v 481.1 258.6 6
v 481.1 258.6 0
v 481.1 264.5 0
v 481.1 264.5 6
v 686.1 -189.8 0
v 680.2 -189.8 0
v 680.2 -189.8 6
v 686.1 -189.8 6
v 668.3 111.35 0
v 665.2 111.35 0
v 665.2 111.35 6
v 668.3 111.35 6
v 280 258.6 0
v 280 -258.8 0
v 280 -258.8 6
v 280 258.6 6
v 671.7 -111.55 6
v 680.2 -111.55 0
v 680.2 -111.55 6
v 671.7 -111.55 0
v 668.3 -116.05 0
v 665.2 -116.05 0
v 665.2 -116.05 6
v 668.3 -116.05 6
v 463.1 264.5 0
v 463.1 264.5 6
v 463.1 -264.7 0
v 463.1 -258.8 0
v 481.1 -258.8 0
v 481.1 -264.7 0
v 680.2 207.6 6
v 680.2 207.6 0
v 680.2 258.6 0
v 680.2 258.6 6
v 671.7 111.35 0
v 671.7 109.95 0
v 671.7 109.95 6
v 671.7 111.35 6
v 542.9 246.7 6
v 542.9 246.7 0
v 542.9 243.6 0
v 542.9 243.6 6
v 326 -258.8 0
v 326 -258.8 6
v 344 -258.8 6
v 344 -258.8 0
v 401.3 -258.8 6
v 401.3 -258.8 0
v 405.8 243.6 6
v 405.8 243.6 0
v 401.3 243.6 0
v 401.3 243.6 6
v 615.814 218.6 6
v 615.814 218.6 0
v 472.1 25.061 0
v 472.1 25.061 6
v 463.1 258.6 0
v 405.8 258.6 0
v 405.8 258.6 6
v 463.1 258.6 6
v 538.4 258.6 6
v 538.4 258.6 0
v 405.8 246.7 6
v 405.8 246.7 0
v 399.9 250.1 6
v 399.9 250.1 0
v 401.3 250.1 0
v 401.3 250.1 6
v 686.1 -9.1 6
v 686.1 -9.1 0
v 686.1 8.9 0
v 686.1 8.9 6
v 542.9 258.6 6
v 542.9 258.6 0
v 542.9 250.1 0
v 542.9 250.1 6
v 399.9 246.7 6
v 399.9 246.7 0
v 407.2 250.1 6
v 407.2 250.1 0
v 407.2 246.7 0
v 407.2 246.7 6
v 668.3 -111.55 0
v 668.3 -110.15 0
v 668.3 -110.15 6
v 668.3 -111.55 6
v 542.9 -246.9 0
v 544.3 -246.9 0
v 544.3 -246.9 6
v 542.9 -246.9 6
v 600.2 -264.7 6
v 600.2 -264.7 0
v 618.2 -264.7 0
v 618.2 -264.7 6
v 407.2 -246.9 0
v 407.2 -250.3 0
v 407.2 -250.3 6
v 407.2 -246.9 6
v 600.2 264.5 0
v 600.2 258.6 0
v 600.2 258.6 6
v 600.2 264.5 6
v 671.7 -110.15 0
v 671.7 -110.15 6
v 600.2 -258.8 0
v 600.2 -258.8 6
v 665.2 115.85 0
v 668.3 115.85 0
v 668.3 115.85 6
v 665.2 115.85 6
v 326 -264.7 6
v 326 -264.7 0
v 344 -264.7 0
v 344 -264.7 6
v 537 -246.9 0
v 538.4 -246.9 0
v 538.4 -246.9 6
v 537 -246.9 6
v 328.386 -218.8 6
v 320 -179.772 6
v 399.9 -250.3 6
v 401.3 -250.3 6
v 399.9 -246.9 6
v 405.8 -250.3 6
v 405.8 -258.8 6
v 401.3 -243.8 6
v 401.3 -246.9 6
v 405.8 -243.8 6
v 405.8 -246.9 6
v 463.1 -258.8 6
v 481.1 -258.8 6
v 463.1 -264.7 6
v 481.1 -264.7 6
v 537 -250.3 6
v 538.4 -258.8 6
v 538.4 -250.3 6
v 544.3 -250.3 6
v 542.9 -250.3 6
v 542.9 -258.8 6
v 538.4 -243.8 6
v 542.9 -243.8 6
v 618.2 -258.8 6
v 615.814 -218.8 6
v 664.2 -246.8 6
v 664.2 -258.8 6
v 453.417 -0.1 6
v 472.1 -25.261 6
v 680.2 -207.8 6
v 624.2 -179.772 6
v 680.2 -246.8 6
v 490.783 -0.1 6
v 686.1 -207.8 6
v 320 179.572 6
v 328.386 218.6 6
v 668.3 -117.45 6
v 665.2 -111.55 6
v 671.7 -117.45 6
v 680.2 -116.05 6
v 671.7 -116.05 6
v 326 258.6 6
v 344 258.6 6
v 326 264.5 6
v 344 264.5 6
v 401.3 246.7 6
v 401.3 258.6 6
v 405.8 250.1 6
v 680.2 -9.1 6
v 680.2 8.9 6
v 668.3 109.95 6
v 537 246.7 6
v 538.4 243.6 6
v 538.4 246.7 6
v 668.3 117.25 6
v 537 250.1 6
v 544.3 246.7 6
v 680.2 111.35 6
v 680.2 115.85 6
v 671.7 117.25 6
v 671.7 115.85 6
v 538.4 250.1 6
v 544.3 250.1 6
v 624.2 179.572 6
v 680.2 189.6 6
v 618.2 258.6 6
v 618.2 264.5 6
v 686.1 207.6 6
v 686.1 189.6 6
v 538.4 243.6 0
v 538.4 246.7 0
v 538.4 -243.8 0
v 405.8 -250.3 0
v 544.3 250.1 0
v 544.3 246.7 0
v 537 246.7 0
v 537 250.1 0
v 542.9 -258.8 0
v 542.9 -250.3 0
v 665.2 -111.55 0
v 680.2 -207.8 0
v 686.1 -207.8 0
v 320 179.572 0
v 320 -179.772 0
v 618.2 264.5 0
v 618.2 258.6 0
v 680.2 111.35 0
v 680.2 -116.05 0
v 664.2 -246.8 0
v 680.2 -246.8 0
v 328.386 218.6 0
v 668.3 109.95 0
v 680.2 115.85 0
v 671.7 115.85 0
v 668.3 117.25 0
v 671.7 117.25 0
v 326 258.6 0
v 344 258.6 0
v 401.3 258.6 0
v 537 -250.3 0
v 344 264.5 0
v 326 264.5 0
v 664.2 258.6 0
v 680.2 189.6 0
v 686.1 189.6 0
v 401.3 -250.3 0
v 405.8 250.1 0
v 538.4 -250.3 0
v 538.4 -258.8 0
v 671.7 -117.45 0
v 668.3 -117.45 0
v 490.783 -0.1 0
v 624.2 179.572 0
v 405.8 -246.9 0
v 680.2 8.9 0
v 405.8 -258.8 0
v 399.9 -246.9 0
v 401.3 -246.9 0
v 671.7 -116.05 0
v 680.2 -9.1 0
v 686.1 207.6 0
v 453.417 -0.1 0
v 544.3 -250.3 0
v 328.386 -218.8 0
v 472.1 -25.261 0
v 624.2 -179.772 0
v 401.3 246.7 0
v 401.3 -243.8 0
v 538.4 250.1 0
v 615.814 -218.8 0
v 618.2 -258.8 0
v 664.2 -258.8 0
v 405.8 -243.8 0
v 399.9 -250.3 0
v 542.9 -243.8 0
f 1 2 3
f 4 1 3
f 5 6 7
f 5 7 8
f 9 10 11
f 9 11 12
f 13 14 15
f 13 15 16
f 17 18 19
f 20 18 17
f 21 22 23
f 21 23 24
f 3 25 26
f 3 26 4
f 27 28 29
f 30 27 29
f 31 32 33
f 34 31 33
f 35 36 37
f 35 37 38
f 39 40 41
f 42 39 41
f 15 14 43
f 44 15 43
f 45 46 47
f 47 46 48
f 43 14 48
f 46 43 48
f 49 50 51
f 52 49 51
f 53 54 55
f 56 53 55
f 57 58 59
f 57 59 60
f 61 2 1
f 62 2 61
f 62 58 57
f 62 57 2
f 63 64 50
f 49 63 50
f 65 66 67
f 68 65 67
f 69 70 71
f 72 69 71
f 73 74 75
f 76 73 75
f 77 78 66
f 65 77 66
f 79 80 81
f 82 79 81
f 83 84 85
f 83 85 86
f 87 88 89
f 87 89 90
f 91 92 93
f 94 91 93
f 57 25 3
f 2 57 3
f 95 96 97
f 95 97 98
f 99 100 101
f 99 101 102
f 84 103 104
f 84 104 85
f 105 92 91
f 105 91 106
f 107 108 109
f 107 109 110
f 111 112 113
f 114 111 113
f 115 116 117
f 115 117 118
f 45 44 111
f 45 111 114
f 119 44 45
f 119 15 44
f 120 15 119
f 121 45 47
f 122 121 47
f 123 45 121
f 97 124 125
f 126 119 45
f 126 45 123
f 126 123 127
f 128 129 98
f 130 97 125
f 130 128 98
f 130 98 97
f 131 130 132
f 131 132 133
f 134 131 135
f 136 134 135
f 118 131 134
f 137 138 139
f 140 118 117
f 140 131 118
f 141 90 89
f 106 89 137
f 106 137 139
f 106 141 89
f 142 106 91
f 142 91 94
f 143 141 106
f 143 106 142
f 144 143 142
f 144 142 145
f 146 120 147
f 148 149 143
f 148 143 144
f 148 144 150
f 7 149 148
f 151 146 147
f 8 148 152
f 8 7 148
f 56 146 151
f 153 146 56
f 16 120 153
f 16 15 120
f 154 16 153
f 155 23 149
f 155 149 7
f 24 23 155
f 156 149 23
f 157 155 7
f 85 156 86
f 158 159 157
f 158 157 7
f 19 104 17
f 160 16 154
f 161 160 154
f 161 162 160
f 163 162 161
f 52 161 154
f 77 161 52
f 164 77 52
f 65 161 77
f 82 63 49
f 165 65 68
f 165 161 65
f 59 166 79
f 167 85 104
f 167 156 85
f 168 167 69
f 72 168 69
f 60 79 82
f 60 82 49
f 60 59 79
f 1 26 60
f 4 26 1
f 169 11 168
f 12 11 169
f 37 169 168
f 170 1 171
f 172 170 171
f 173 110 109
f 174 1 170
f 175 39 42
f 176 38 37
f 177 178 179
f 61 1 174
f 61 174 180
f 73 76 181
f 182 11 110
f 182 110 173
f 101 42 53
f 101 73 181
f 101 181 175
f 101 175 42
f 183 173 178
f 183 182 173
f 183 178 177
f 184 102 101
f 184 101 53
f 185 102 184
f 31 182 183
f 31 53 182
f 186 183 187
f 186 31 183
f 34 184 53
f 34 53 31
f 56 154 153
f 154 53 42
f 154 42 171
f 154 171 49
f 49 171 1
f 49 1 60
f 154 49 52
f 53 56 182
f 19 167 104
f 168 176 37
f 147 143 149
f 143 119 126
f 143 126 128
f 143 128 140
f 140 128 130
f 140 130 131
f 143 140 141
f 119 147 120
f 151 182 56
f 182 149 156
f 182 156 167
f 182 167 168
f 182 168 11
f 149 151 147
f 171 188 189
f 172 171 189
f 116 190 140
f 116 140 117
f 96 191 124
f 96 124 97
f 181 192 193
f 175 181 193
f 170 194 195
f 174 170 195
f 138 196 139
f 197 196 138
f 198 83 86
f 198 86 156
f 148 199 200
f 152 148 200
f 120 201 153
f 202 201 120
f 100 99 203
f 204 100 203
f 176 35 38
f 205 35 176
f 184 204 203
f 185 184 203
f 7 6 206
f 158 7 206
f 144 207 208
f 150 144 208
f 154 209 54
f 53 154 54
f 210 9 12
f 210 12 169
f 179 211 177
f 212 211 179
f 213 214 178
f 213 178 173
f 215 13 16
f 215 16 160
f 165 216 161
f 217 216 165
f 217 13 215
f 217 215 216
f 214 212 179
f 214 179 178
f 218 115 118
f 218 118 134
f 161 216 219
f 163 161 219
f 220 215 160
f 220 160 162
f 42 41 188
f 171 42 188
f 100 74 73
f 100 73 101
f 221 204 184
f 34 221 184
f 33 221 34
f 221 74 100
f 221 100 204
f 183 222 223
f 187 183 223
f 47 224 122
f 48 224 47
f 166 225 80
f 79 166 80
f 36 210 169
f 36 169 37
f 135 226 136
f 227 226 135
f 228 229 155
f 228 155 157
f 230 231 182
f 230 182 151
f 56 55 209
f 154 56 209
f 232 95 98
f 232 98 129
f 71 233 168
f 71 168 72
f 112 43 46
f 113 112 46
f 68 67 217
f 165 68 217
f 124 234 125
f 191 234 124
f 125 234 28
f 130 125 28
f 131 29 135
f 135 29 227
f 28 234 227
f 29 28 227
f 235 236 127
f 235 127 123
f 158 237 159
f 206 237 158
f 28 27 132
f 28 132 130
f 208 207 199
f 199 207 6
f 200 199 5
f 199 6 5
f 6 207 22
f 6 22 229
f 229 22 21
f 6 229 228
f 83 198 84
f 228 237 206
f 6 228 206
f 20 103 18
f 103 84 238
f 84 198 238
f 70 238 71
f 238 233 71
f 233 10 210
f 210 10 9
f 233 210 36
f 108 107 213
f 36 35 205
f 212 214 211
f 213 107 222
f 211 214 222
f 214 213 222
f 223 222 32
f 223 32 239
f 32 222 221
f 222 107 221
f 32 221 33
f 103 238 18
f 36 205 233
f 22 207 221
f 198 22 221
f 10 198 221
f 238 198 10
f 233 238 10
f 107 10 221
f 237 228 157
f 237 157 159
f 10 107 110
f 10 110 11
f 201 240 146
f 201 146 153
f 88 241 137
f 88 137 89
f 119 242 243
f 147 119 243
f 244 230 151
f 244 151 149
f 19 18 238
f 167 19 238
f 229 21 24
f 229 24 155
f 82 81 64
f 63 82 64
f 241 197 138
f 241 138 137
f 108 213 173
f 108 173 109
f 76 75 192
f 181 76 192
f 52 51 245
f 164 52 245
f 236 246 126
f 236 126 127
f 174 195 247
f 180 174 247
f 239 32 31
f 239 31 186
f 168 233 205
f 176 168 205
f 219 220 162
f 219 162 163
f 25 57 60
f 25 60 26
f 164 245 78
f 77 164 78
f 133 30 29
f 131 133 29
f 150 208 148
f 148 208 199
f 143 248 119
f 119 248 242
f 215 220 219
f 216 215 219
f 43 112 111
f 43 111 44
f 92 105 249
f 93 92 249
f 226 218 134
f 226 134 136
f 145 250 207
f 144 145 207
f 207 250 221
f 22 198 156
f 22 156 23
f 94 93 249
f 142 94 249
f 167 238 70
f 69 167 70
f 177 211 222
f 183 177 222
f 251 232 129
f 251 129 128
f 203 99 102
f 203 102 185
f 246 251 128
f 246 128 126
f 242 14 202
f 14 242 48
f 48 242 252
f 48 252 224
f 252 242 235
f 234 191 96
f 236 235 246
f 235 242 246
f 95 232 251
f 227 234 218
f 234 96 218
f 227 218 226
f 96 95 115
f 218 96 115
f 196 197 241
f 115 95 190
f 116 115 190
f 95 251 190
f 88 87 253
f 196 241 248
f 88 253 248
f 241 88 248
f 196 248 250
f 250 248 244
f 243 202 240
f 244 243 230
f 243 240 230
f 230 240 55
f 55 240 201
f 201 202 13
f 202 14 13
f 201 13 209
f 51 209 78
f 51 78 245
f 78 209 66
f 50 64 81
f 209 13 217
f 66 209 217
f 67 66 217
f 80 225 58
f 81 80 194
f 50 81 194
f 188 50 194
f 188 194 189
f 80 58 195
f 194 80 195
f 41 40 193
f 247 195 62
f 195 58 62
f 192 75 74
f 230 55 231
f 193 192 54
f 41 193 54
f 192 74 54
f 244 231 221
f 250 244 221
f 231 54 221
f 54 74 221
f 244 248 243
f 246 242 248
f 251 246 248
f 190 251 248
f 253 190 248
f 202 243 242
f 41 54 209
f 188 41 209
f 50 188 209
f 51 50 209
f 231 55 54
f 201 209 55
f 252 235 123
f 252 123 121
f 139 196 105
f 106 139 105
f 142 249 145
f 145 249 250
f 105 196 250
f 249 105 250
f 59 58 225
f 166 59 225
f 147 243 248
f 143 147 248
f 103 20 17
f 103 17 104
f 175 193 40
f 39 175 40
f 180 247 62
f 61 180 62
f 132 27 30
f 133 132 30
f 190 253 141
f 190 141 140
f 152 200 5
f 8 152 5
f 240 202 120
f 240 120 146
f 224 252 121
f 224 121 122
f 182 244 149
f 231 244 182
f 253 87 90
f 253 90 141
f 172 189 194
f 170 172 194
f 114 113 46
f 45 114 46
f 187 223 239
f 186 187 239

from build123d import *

# Parameters (mm, degrees)
EXTRUDE_1_DEPTH            = 6
EXTRUDE_1_DEPTH_BACK       = 0.0001
SKETCH_1_W                 = 384.2
SKETCH_1_H                 = 517.4
SKETCH_2562_W              = 18
SKETCH_2562_H              = 6.2
EXTRUDE_2573_DEPTH         = 6
CUT_EXTRUDE_4_DEPTH        = 716.027083403
CUT_EXTRUDE_4_DEPTH_BACK   = 716.027083403
SKETCH_2698_W              = 17
SKETCH_2698_H              = 505.4
EXTRUDE_2764_DEPTH         = 6
SKETCH_2820_W              = 6.2
SKETCH_2820_H              = 18
EXTRUDE_2968_DEPTH         = 6
CUT_EXTRUDE_4_2_DEPTH      = 736.415052878
CUT_EXTRUDE_4_2_DEPTH_BACK = 736.415052878


with BuildPart() as part:
    # Эскиз1 → Бобышка-Вытянуть1 (new, two sides: drawn at the far end of the back side and taken through both)
    with BuildSketch(Plane.XY.offset(-EXTRUDE_1_DEPTH_BACK)):
        with Locations((472.1, -0.1)):
            Rectangle(SKETCH_1_W, SKETCH_1_H)
        Polygon((624.2, 179.571602285), (490.783243916, -0.1), (624.2, -179.771602285), align=None, mode=Mode.SUBTRACT)
        Polygon((615.81439814, 218.6), (472.1, 25.060620516), (328.38560186, 218.6), align=None, mode=Mode.SUBTRACT)
        Polygon((615.81439814, -218.8), (328.38560186, -218.8), (472.1, -25.260620516), align=None, mode=Mode.SUBTRACT)
        Polygon((320, 179.571602285), (320, -179.771602285), (453.416756084, -0.1), align=None, mode=Mode.SUBTRACT)
    extrude(amount=EXTRUDE_1_DEPTH + EXTRUDE_1_DEPTH_BACK)

    # Sketch 2562 → Extrude 2573 (add)
    with BuildSketch(Plane.XY):
        with Locations((335, -261.6)):
            Rectangle(SKETCH_2562_W, SKETCH_2562_H)
        with Locations((472.1, -261.6)):
            Rectangle(SKETCH_2562_W, SKETCH_2562_H)
        with Locations((609.2, -261.6)):
            Rectangle(SKETCH_2562_W, SKETCH_2562_H)
        with Locations((335, 261.4)):
            Rectangle(SKETCH_2562_W, SKETCH_2562_H)
        with Locations((472.1, 261.4)):
            Rectangle(SKETCH_2562_W, SKETCH_2562_H)
        with Locations((609.2, 261.4)):
            Rectangle(SKETCH_2562_W, SKETCH_2562_H)
    extrude(amount=EXTRUDE_2573_DEPTH)

    # Sketch 4 → Cut-Extrude 4 (cut, two sides: drawn at the far end of the back side and taken through both)
    with BuildSketch(Plane.XY.offset(-CUT_EXTRUDE_4_DEPTH_BACK)):
        Polygon((401.3, -259.8), (405.8, -259.8), (405.8, -250.3), (407.2, -250.3), (407.2, -246.9), (405.8, -246.9), (405.8, -243.8), (401.3, -243.8), (401.3, -246.9), (399.9, -246.9), (399.9, -250.3), (401.3, -250.3), align=None)
        Polygon((538.4, -259.8), (542.9, -259.8), (542.9, -250.3), (544.3, -250.3), (544.3, -246.9), (542.9, -246.9), (542.9, -243.8), (538.4, -243.8), (538.4, -246.9), (537, -246.9), (537, -250.3), (538.4, -250.3), align=None)
        Polygon((401.3, 259.6), (405.8, 259.6), (405.8, 250.1), (407.2, 250.1), (407.2, 246.7), (405.8, 246.7), (405.8, 243.6), (401.3, 243.6), (401.3, 246.7), (399.9, 246.7), (399.9, 250.1), (401.3, 250.1), align=None)
        Polygon((538.4, 259.6), (542.9, 259.6), (542.9, 250.1), (544.3, 250.1), (544.3, 246.7), (542.9, 246.7), (542.9, 243.6), (538.4, 243.6), (538.4, 246.7), (537, 246.7), (537, 250.1), (538.4, 250.1), align=None)
    extrude(amount=CUT_EXTRUDE_4_DEPTH + CUT_EXTRUDE_4_DEPTH_BACK, mode=Mode.SUBTRACT)

    # Sketch 2698 → Extrude 2764 (add)
    with BuildSketch(Plane.XY):
        with Locations((671.7, 5.9)):
            Rectangle(SKETCH_2698_W, SKETCH_2698_H)
    extrude(amount=EXTRUDE_2764_DEPTH)

    # Sketch 2820 → Extrude 2968 (add)
    with BuildSketch(Plane.XY):
        with Locations((683, -198.8)):
            Rectangle(SKETCH_2820_W, SKETCH_2820_H)
        with Locations((683, -0.1)):
            Rectangle(SKETCH_2820_W, SKETCH_2820_H)
        with Locations((683, 198.6)):
            Rectangle(SKETCH_2820_W, SKETCH_2820_H)
    extrude(amount=EXTRUDE_2968_DEPTH)

    # Sketch 4 2 → Cut-Extrude 4 2 (cut, two sides: drawn at the far end of the back side and taken through both)
    with BuildSketch(Plane.XY.offset(-CUT_EXTRUDE_4_2_DEPTH_BACK)):
        Polygon((681.2, -116.05), (681.2, -111.55), (671.7, -111.55), (671.7, -110.15), (668.3, -110.15), (668.3, -111.55), (665.2, -111.55), (665.2, -116.05), (668.3, -116.05), (668.3, -117.45), (671.7, -117.45), (671.7, -116.05), align=None)
        Polygon((681.2, 111.35), (681.2, 115.85), (671.7, 115.85), (671.7, 117.25), (668.3, 117.25), (668.3, 115.85), (665.2, 115.85), (665.2, 111.35), (668.3, 111.35), (668.3, 109.95), (671.7, 109.95), (671.7, 111.35), align=None)
    extrude(amount=CUT_EXTRUDE_4_2_DEPTH + CUT_EXTRUDE_4_2_DEPTH_BACK, mode=Mode.SUBTRACT)


solid = part.part
